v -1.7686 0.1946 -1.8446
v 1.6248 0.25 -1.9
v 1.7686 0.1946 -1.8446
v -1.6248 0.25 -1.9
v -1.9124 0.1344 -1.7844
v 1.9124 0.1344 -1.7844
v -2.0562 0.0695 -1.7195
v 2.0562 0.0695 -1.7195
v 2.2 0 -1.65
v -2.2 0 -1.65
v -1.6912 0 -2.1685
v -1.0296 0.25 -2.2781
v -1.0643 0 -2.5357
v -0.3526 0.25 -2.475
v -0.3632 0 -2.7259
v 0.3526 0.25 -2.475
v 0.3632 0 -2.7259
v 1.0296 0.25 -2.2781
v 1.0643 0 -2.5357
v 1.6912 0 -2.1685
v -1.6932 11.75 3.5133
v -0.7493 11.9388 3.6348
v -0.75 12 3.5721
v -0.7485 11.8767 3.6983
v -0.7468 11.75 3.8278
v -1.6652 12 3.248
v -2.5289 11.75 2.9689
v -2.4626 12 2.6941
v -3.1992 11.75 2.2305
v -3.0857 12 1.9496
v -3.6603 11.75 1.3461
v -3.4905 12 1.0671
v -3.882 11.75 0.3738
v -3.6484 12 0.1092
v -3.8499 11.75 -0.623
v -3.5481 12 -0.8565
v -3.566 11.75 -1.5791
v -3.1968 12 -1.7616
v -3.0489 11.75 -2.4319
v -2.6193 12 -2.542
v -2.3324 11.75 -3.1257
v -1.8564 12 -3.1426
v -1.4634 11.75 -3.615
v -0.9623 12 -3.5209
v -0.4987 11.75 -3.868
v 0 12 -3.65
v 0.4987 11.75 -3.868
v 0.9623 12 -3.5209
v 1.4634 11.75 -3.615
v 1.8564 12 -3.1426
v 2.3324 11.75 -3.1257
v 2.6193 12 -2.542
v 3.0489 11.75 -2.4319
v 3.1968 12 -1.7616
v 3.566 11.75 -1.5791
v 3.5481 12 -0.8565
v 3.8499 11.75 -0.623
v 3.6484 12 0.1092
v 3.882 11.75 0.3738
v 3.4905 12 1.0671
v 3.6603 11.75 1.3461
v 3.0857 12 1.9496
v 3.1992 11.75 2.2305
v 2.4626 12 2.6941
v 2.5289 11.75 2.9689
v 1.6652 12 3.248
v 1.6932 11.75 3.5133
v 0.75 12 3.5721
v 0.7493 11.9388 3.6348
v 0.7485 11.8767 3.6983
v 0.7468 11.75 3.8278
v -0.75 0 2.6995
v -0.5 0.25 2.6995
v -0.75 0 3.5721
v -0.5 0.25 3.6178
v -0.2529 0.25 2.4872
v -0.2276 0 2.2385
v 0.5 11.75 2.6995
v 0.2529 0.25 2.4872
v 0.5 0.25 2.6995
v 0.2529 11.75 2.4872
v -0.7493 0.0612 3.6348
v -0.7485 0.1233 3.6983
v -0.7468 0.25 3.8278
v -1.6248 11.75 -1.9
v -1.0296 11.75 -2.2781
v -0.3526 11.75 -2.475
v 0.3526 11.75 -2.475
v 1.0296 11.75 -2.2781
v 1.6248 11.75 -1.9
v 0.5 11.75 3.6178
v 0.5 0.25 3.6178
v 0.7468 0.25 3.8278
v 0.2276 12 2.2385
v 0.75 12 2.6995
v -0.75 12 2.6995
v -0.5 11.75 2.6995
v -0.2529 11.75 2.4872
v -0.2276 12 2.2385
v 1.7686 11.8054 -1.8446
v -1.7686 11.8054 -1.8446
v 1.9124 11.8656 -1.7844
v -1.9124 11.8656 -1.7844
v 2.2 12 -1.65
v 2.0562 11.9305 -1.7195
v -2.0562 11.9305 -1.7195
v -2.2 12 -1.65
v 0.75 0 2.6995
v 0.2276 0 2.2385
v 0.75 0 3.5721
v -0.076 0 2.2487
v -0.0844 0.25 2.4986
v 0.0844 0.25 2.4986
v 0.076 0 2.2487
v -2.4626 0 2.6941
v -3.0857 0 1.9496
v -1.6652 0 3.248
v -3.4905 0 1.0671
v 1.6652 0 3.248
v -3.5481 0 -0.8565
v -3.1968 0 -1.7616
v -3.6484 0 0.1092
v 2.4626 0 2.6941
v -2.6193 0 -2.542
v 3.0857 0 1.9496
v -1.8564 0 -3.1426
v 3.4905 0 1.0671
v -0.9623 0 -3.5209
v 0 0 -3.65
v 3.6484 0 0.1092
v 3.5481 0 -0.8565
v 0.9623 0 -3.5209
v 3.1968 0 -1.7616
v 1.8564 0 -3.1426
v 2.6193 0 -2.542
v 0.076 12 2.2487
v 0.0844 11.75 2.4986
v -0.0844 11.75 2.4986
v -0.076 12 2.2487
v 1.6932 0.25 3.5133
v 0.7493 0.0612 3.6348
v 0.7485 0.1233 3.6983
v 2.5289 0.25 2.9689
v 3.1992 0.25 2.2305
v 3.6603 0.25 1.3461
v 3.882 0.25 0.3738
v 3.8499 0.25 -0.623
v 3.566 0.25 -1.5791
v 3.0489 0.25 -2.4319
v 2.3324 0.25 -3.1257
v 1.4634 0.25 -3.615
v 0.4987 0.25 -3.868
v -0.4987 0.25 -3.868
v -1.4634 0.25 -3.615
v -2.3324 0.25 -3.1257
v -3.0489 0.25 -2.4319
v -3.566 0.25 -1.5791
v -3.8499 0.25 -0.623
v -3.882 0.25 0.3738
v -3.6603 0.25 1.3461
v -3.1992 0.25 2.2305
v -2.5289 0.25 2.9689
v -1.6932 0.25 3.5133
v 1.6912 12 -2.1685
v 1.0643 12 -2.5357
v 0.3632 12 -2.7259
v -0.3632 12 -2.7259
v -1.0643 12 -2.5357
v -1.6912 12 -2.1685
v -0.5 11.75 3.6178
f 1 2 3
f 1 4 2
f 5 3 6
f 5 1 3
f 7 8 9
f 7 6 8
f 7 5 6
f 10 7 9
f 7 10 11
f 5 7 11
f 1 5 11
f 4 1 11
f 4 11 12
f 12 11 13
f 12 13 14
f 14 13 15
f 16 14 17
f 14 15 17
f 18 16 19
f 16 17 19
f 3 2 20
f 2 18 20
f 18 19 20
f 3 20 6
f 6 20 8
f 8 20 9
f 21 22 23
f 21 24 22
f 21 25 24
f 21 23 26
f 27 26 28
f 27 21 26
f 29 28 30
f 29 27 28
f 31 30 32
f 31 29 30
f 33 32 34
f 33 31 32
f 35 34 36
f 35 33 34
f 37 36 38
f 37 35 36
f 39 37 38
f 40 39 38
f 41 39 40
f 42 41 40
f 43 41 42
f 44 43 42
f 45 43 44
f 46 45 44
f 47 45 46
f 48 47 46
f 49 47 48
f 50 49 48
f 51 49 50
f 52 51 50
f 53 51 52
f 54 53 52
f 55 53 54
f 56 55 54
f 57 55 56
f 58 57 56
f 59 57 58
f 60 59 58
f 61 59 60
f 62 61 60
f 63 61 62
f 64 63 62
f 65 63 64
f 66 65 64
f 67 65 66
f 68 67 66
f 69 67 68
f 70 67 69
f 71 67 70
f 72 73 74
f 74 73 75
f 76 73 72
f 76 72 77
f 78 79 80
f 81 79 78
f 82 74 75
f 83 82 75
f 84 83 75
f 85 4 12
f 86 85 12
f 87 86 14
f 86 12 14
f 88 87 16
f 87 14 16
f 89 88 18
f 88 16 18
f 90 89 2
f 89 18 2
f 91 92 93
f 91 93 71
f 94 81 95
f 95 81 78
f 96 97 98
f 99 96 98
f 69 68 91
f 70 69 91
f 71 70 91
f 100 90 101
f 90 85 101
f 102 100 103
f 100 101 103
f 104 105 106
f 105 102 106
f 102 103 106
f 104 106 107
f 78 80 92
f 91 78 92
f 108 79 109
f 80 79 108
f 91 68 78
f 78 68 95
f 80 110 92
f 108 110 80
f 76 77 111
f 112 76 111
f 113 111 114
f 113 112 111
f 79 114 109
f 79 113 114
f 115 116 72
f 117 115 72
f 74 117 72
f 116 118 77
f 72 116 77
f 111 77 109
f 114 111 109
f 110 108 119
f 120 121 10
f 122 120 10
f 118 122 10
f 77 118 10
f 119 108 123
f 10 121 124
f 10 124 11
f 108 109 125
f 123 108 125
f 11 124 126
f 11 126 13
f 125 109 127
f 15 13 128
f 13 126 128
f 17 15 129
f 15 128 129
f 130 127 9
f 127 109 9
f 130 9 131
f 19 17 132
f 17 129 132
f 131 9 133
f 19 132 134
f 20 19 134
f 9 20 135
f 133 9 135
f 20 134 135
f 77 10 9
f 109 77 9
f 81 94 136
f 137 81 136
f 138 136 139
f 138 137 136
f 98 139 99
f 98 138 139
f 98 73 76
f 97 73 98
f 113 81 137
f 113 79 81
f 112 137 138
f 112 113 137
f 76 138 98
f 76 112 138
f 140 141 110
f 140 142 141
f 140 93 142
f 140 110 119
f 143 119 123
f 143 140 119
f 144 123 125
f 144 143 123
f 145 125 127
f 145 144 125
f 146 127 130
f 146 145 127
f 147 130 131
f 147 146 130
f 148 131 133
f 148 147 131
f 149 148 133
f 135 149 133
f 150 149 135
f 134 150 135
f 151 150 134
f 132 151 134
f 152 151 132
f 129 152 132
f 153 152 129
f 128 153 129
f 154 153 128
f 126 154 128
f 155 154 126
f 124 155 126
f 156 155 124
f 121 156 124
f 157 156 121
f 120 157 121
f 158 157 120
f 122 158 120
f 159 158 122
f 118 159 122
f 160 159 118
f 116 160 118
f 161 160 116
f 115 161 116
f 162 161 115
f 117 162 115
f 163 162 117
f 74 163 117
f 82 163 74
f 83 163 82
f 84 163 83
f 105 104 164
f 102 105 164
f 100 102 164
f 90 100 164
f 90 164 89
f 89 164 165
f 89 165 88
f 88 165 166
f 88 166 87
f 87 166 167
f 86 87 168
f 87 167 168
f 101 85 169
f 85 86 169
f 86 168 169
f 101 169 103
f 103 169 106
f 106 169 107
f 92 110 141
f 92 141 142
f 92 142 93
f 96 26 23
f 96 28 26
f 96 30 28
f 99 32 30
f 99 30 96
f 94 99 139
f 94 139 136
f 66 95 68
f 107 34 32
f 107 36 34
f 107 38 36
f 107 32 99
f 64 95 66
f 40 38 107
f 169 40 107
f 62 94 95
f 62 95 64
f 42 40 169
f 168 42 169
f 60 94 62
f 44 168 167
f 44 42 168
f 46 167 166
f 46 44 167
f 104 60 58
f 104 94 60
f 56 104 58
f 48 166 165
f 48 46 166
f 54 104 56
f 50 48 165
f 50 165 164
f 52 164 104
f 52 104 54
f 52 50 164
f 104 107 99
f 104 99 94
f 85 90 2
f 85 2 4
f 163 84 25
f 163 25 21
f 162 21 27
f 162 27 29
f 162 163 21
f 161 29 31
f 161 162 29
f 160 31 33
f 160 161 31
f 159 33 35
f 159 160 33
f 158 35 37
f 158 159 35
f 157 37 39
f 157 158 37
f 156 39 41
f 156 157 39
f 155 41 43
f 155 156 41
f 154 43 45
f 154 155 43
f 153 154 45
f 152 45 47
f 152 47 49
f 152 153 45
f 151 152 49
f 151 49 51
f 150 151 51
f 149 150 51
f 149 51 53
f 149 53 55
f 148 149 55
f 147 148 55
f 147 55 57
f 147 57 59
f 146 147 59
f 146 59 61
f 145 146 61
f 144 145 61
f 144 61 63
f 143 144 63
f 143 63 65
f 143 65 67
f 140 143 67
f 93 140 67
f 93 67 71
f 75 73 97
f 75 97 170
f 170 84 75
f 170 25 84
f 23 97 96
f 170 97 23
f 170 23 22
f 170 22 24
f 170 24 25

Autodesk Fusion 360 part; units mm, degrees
sketch "Sketch1" plane through (0, 0, 0) normal (0, 1, 0) x (1, 0, 0) in component "Coupler"
  circle A0 centre (0, 0) radius 3.9
  circle A1 centre (0, 0) radius 2.5
  line L0 (0, 0) -> (0, 1.9) construction
  line L1 (0, 1.9) -> (1.6248, 1.9)
  line L2 (0, 1.9) -> (-1.6248, 1.9)
  line L3 (0, 0) -> (0, -1.6667) construction
  line L4 (0, -1.6667) -> (0.5, -1.6667) construction
  line L5 (0, -1.6667) -> (-0.5, -1.6667) construction
  line L6 (0.5, -1.6667) -> (0.5, -3.8678)
  line L7 (-0.5, -1.6667) -> (-0.5, -3.8678)
  dimension "d6" = 7.8
  dimension "d7" = 5
  dimension "d8" = 1.9
  dimension "d9" = 1.6667
  dimension "d10" = 0.5
  dimension "d11" = 0.5
extrude "Extrude1" add sketch "Sketch1" along normal blind 12 contours A0 A1 L6 L7 | A1 L1 L2 picked at (-1.1759, -3.2181) picked at (-0.4526, -0.9659) in component "Coupler"
chamfer "Chamfer1" distance 0.25 angle 45 4 faces at (-0.1667, 12, -0.4502) (-0.1667, 0, -0.4502) (-0.5, 4, 2.9223) (0.5, 4, 2.9223) in component "Coupler"
component "Coupler" placed x (1, 0, 0) y (0, 1, 0) z (0, 0, 1) at (0, 0, 0)
equation "MotorShaftDiameter = 5 mm"
equation "MotorShaftKeyDiameter = 4.4 mm"
equation "CouplerDiameter = 7.8 mm"
equation "CouplerHeight = 12 mm"
equation "Gap = 1 mm"
equation "d6 = CouplerDiameter"
equation "d7 = MotorShaftDiameter"
equation "d8 = MotorShaftKeyDiameter - MotorShaftDiameter / 2"
equation "d9 = MotorShaftDiameter / 3"
equation "d10 = Gap / 2"
equation "d11 = d10"
equation "d12 = CouplerHeight"
